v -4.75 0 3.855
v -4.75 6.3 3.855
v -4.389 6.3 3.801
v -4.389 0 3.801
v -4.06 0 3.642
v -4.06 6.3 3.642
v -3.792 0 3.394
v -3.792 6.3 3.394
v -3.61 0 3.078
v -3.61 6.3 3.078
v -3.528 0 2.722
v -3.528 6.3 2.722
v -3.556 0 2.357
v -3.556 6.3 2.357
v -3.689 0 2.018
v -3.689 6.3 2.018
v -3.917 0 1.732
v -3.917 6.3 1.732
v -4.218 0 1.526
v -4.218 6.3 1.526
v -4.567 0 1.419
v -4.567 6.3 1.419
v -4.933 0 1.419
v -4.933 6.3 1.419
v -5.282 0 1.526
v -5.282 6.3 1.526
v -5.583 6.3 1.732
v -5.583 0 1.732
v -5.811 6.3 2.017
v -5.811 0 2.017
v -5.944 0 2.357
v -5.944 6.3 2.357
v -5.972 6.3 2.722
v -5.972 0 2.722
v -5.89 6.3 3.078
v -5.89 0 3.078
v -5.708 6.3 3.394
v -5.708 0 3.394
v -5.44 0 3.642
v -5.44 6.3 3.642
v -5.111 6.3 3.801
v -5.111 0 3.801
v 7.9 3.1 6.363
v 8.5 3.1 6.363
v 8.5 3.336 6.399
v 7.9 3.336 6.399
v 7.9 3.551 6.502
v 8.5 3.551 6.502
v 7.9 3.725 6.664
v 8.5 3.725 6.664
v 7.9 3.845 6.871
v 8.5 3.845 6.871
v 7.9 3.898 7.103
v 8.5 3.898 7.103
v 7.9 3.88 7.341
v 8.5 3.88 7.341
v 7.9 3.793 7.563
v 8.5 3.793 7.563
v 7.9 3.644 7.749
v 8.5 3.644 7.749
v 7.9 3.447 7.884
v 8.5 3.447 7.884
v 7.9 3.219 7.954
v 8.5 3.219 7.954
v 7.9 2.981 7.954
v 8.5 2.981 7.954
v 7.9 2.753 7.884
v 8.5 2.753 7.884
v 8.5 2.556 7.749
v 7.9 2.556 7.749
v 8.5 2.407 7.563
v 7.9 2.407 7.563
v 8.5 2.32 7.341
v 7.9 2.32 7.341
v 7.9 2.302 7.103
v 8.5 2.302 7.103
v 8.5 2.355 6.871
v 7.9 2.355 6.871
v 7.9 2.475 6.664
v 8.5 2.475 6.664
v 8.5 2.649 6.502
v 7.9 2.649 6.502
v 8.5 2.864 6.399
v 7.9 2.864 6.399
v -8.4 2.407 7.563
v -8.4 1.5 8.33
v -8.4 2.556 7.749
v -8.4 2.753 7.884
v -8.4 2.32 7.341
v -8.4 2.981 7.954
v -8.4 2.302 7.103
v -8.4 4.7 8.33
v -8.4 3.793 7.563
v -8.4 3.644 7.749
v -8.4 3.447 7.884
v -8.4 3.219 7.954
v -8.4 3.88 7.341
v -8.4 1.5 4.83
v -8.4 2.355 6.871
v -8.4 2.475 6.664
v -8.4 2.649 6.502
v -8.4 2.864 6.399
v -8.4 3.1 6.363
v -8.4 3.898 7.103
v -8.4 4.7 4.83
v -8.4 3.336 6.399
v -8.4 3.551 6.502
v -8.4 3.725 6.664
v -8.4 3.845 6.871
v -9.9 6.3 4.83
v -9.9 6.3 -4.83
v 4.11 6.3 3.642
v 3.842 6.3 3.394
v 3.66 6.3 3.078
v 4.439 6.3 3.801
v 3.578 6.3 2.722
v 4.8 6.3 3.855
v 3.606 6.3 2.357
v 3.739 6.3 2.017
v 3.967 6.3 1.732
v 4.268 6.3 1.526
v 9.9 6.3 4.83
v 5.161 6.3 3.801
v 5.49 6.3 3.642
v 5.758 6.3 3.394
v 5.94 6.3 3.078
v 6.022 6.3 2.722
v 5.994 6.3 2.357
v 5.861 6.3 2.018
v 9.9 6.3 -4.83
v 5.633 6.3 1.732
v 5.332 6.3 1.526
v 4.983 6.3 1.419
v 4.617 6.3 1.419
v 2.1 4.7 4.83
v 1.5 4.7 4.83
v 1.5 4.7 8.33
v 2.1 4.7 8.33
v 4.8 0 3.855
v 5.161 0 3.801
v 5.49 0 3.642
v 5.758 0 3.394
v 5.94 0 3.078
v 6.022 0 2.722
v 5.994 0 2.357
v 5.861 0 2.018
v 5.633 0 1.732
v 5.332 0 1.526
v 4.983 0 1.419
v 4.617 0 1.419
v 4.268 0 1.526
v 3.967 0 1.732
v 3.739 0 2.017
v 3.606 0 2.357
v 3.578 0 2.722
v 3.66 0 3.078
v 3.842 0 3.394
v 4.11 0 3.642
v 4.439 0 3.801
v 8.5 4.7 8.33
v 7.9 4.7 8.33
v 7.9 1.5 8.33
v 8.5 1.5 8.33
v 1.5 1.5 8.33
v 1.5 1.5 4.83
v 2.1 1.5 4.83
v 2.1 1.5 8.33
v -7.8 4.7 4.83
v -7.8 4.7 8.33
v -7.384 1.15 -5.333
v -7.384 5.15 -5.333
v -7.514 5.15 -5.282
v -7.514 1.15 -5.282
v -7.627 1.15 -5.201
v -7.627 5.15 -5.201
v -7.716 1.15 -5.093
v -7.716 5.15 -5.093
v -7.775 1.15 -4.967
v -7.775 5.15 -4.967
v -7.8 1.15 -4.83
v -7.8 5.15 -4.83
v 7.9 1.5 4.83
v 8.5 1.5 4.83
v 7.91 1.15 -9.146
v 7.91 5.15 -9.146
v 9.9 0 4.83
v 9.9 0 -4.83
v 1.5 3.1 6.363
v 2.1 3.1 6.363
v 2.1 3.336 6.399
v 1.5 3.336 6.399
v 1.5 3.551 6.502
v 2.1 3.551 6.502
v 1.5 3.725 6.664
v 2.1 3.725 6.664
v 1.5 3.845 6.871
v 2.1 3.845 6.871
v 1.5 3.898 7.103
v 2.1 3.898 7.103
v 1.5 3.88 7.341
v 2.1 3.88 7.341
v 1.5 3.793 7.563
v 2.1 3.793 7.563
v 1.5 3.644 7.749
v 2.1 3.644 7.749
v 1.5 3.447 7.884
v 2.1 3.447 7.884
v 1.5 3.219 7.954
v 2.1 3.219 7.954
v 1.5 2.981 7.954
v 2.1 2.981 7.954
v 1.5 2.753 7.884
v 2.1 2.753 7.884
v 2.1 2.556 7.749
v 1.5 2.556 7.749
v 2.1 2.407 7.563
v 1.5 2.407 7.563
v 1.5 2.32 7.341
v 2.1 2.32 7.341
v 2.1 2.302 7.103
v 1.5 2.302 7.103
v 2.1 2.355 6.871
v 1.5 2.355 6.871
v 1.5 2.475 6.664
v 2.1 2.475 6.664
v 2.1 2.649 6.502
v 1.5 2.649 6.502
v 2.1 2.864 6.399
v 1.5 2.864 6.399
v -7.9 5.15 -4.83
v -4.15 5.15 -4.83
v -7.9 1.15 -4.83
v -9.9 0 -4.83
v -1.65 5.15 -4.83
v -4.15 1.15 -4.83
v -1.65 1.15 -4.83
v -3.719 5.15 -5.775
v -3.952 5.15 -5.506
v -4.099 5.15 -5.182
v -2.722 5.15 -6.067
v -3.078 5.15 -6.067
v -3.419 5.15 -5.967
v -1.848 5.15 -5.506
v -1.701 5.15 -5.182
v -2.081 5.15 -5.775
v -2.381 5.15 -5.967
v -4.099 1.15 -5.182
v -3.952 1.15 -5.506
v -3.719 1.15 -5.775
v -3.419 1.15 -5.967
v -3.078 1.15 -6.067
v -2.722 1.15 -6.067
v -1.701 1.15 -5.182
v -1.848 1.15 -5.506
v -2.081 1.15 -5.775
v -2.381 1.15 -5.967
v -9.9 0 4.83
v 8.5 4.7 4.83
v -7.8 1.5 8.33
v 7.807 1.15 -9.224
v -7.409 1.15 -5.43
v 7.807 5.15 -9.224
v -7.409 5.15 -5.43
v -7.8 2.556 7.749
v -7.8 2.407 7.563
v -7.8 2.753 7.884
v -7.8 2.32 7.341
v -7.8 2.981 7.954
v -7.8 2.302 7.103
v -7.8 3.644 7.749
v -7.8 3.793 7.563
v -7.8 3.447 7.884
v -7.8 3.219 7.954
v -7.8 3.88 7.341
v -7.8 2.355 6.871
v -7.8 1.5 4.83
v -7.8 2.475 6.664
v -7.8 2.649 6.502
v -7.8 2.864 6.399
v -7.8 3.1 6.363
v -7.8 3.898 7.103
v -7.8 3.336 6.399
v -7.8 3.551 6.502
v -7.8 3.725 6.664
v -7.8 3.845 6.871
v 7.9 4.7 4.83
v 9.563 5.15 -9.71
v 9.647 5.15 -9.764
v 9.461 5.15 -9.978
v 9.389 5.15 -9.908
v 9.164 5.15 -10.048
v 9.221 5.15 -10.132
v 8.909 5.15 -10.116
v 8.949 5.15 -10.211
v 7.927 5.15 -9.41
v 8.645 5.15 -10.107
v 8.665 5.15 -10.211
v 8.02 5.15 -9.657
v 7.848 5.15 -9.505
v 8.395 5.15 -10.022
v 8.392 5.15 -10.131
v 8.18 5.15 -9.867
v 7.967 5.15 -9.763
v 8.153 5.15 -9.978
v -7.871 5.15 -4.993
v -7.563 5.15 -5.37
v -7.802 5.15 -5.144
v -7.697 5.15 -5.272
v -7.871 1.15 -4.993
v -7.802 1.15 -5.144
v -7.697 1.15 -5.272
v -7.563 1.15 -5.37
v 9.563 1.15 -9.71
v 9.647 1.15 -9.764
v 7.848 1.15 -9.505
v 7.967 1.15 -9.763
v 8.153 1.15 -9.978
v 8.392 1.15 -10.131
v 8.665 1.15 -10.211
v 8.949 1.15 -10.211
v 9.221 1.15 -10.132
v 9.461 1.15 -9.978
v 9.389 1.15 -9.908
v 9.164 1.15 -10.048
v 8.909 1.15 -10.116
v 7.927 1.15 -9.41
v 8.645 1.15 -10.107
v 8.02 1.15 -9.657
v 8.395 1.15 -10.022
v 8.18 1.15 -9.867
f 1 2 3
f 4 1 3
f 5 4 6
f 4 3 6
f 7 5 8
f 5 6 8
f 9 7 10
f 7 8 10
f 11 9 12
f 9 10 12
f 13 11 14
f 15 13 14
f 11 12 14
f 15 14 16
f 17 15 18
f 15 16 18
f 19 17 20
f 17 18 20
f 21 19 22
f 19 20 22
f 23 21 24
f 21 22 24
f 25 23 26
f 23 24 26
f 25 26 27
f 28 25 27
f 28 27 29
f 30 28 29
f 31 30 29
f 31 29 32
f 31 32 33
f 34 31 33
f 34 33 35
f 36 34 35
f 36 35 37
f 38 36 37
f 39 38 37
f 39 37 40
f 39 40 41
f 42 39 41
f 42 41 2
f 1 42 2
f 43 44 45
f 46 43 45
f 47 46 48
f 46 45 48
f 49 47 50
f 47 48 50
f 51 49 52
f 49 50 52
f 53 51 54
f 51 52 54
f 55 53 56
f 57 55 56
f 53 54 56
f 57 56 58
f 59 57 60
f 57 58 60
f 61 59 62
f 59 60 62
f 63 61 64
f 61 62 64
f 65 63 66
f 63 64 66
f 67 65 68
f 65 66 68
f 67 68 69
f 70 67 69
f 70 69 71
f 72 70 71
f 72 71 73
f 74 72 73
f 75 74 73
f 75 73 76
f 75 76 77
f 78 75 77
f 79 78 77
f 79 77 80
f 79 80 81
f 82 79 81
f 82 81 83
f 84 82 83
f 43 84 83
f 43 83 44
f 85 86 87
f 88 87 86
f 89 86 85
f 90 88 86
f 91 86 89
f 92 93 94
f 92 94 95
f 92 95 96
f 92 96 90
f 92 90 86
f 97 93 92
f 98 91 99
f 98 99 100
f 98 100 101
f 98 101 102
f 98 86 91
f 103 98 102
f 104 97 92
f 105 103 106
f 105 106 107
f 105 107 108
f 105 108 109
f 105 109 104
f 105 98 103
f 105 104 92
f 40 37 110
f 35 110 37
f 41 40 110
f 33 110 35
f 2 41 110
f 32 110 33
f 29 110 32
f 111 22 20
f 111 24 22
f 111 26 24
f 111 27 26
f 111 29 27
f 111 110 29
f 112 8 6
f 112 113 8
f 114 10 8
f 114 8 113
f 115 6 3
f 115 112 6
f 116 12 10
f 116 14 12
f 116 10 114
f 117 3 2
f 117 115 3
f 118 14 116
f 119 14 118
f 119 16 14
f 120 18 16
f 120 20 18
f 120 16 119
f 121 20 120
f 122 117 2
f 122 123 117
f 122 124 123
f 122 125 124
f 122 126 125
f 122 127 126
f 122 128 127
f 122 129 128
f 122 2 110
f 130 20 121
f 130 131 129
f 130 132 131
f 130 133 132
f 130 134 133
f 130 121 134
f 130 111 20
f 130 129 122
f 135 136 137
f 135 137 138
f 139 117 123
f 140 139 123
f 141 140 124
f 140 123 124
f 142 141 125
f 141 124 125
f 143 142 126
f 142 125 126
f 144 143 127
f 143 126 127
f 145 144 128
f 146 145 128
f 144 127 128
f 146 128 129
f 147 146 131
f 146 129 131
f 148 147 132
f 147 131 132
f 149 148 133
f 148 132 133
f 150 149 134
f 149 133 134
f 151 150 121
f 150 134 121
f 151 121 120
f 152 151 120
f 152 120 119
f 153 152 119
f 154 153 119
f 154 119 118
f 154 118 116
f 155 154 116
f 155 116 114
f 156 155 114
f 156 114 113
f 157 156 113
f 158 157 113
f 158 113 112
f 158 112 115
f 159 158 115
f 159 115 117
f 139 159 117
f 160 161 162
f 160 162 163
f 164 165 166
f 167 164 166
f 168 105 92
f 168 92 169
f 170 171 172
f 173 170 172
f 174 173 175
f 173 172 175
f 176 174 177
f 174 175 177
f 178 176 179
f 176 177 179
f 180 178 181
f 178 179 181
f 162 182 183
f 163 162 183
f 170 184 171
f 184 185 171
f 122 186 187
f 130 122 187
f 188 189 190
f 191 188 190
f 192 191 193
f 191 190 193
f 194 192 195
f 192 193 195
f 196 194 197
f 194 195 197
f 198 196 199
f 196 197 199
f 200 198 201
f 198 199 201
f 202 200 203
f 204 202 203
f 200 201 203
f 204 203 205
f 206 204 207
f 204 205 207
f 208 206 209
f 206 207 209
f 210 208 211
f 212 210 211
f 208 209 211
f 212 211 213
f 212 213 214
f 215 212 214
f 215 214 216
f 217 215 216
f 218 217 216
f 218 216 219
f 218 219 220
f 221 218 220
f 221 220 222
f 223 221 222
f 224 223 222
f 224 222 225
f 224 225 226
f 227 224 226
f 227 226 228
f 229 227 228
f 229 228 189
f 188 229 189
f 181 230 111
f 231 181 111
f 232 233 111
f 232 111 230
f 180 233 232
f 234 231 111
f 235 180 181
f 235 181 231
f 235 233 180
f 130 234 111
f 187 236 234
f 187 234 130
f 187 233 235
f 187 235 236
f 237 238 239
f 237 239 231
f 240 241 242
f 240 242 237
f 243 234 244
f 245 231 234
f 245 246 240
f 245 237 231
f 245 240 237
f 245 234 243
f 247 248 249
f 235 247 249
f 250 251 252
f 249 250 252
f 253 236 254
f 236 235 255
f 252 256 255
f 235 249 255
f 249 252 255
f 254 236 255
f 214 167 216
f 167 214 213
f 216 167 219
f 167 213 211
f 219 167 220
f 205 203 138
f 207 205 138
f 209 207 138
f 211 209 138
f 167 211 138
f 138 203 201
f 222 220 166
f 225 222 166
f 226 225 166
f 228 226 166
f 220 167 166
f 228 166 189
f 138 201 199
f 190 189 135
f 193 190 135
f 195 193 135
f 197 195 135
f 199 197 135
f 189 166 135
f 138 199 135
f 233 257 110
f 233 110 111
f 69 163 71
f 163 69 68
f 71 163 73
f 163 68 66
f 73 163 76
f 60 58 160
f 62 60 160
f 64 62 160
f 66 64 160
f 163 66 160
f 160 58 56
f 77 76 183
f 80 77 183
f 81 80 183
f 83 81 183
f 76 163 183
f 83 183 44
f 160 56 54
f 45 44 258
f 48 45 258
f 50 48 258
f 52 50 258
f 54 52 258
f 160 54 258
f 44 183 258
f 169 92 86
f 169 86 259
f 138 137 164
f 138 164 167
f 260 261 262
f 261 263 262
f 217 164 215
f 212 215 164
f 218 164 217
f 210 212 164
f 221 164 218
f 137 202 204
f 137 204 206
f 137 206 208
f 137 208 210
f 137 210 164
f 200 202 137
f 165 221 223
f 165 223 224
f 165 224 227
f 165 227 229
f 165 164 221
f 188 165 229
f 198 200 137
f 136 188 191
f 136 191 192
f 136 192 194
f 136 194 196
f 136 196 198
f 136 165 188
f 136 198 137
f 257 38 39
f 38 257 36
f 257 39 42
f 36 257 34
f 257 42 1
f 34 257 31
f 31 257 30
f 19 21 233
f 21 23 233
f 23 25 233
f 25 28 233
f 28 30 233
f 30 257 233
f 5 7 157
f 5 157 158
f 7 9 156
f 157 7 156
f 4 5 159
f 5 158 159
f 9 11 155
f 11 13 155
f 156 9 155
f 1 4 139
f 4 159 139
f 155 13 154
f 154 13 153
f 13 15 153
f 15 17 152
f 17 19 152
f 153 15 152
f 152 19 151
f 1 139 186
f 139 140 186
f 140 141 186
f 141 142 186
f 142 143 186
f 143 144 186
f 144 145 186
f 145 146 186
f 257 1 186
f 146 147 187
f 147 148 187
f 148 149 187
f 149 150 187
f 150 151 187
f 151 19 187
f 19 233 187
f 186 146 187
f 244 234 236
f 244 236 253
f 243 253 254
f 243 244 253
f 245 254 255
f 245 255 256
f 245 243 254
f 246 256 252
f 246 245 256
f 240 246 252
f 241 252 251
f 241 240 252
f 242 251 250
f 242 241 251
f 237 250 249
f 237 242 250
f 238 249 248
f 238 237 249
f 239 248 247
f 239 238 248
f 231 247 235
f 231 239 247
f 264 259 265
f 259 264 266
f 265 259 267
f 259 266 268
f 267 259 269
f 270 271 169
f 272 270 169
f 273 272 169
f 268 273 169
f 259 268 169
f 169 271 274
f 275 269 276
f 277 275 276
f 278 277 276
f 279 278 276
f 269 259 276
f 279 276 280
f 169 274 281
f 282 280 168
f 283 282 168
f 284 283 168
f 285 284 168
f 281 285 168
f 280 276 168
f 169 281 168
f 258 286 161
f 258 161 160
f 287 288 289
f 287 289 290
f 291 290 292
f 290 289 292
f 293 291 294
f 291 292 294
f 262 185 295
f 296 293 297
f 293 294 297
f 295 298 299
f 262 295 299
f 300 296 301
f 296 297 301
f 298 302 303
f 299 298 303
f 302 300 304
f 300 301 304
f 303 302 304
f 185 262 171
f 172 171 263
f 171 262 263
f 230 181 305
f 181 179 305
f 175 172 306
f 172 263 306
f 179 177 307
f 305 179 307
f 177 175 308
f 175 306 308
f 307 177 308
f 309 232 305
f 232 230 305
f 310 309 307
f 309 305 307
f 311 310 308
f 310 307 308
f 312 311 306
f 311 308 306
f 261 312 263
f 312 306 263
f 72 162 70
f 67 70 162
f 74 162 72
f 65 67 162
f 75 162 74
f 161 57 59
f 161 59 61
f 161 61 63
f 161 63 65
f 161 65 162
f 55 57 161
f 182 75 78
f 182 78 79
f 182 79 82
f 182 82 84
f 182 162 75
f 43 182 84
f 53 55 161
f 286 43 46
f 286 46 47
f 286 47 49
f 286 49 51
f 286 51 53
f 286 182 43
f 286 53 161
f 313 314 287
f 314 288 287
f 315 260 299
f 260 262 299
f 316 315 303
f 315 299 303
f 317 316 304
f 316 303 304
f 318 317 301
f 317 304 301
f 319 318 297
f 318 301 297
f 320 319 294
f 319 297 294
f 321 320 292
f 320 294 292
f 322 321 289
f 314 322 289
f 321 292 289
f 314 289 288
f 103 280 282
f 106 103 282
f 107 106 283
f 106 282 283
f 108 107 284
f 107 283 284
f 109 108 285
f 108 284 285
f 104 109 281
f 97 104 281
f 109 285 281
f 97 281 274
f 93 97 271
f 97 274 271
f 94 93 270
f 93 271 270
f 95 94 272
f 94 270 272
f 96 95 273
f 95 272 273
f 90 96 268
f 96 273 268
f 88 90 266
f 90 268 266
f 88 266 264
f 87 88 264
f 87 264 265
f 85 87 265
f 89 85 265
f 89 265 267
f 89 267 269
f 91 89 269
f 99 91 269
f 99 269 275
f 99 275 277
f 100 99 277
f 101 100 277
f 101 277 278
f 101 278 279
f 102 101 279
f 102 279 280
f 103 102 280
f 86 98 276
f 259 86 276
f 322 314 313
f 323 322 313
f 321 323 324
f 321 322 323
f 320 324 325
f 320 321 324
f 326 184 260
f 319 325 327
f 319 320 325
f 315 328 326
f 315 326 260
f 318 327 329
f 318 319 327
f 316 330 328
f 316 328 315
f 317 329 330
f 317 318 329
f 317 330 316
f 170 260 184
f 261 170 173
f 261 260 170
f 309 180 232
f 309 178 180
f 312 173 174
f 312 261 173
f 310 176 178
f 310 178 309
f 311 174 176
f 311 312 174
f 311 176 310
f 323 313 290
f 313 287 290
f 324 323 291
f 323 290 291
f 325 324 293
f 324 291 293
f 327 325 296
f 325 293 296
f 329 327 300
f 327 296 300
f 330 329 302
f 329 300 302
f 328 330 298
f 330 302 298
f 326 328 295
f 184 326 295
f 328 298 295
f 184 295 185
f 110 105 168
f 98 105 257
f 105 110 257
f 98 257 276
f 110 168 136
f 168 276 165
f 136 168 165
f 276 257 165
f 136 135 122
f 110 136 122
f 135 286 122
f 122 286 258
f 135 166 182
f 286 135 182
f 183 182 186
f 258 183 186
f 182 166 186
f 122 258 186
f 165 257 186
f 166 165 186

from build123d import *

# Parameters (mm, degrees)
SKETCH1_W           = 19.8
SKETCH1_H           = 9.66
MAINBODY_DEPTH      = 6.3
SKETCH2_R           = 1.225
MOUNTINGHOLES_DEPTH = 13.689716309
SKETCH3_W           = 0.6
SKETCH3_H           = 3.2
BOSS_EXTRUDE2_DEPTH = 3.5
SKETCH4_R           = 0.8
CUT_EXTRUDE2_DEPTH  = 22.157478583
SKETCH5_R           = 1.25
BUMPSWITCH_DEPTH    = 2
EXTRUDE_THIN1_DEPTH = 2


with BuildPart() as part:
    # Sketch1 → MainBody (new body)
    with BuildSketch(Plane(origin=(0, 0, 0), x_dir=(1, 0, 0), z_dir=(0, 1, 0))):
        Rectangle(SKETCH1_W, SKETCH1_H)
    extrude(amount=MAINBODY_DEPTH)

    # Sketch2 → MountingHoles (cut, through all)
    with BuildSketch(Plane(origin=(0, 6.3, 0), x_dir=(1, 0, 0), z_dir=(0, 1, 0))):
        with Locations(Location((-4.75, -2.63, 0), (0, 0, 270))):
            Circle(SKETCH2_R)
        with Locations(Location((4.8, -2.63, 0), (0, 0, 270))):
            Circle(SKETCH2_R)
    extrude(amount=-MOUNTINGHOLES_DEPTH, mode=Mode.SUBTRACT)

    # Sketch3 → Boss-Extrude2 (add)
    with BuildSketch(Plane.XY.offset(4.83)):
        with Locations((-8.1, 3.1)):
            Rectangle(SKETCH3_W, SKETCH3_H)
        with Locations((1.8, 3.1)):
            Rectangle(SKETCH3_W, SKETCH3_H)
        with Locations((8.2, 3.1)):
            Rectangle(SKETCH3_W, SKETCH3_H)
    extrude(amount=BOSS_EXTRUDE2_DEPTH)

    # Sketch4 → Cut-Extrude2 (cut, through all)
    with BuildSketch(Plane(origin=(8.5, 0, 0), x_dir=(0, 0, -1), z_dir=(1, 0, 0))):
        with Locations((-7.162962761, 3.1)):
            Circle(SKETCH4_R)
    extrude(amount=-CUT_EXTRUDE2_DEPTH, mode=Mode.SUBTRACT)

    # Sketch5 → BumpSwitch (add, symmetric)
    with BuildSketch(Plane(origin=(0, 3.15, 0), x_dir=(1, 0, 0), z_dir=(0, 1, 0))):
        with Locations((-2.9, 4.83)):
            Circle(SKETCH5_R)
    extrude(amount=BUMPSWITCH_DEPTH, both=True)

    # Sketch6 → Extrude-Thin1 (add, symmetric)
    with BuildSketch(Plane(origin=(0, 3.15, 0), x_dir=(1, 0, 0), z_dir=(0, 1, 0))):
        with BuildLine():
            Line((-7.9, 4.222056191), (-7.9, 4.83))
            ThreePointArc((-7.9, 4.83), (-7.753756221, 5.211453805), (-7.408601461, 5.43))
            Line((-7.408601461, 5.43), (7.80720966, 9.223727798))
            ThreePointArc((7.80720966, 9.223727798), (8.52542957, 10.181011183), (9.647220295, 9.764097659))
            Line((9.647220295, 9.764097659), (9.56321899, 9.709841039))
            ThreePointArc((9.56321899, 9.709841039), (8.516809587, 10.073393654), (7.910350182, 9.146382256))
            Line((7.910350182, 9.146382256), (-7.384409271, 5.332970427))
            ThreePointArc((-7.384409271, 5.332970427), (-7.675692454, 5.148943939), (-7.8, 4.827604127))
            Line((-7.8, 4.827604127), (-7.8, 4.222056191))
            Line((-7.8, 4.222056191), (-7.9, 4.222056191))
        make_face()
    extrude(amount=EXTRUDE_THIN1_DEPTH, both=True)


solid = part.part
